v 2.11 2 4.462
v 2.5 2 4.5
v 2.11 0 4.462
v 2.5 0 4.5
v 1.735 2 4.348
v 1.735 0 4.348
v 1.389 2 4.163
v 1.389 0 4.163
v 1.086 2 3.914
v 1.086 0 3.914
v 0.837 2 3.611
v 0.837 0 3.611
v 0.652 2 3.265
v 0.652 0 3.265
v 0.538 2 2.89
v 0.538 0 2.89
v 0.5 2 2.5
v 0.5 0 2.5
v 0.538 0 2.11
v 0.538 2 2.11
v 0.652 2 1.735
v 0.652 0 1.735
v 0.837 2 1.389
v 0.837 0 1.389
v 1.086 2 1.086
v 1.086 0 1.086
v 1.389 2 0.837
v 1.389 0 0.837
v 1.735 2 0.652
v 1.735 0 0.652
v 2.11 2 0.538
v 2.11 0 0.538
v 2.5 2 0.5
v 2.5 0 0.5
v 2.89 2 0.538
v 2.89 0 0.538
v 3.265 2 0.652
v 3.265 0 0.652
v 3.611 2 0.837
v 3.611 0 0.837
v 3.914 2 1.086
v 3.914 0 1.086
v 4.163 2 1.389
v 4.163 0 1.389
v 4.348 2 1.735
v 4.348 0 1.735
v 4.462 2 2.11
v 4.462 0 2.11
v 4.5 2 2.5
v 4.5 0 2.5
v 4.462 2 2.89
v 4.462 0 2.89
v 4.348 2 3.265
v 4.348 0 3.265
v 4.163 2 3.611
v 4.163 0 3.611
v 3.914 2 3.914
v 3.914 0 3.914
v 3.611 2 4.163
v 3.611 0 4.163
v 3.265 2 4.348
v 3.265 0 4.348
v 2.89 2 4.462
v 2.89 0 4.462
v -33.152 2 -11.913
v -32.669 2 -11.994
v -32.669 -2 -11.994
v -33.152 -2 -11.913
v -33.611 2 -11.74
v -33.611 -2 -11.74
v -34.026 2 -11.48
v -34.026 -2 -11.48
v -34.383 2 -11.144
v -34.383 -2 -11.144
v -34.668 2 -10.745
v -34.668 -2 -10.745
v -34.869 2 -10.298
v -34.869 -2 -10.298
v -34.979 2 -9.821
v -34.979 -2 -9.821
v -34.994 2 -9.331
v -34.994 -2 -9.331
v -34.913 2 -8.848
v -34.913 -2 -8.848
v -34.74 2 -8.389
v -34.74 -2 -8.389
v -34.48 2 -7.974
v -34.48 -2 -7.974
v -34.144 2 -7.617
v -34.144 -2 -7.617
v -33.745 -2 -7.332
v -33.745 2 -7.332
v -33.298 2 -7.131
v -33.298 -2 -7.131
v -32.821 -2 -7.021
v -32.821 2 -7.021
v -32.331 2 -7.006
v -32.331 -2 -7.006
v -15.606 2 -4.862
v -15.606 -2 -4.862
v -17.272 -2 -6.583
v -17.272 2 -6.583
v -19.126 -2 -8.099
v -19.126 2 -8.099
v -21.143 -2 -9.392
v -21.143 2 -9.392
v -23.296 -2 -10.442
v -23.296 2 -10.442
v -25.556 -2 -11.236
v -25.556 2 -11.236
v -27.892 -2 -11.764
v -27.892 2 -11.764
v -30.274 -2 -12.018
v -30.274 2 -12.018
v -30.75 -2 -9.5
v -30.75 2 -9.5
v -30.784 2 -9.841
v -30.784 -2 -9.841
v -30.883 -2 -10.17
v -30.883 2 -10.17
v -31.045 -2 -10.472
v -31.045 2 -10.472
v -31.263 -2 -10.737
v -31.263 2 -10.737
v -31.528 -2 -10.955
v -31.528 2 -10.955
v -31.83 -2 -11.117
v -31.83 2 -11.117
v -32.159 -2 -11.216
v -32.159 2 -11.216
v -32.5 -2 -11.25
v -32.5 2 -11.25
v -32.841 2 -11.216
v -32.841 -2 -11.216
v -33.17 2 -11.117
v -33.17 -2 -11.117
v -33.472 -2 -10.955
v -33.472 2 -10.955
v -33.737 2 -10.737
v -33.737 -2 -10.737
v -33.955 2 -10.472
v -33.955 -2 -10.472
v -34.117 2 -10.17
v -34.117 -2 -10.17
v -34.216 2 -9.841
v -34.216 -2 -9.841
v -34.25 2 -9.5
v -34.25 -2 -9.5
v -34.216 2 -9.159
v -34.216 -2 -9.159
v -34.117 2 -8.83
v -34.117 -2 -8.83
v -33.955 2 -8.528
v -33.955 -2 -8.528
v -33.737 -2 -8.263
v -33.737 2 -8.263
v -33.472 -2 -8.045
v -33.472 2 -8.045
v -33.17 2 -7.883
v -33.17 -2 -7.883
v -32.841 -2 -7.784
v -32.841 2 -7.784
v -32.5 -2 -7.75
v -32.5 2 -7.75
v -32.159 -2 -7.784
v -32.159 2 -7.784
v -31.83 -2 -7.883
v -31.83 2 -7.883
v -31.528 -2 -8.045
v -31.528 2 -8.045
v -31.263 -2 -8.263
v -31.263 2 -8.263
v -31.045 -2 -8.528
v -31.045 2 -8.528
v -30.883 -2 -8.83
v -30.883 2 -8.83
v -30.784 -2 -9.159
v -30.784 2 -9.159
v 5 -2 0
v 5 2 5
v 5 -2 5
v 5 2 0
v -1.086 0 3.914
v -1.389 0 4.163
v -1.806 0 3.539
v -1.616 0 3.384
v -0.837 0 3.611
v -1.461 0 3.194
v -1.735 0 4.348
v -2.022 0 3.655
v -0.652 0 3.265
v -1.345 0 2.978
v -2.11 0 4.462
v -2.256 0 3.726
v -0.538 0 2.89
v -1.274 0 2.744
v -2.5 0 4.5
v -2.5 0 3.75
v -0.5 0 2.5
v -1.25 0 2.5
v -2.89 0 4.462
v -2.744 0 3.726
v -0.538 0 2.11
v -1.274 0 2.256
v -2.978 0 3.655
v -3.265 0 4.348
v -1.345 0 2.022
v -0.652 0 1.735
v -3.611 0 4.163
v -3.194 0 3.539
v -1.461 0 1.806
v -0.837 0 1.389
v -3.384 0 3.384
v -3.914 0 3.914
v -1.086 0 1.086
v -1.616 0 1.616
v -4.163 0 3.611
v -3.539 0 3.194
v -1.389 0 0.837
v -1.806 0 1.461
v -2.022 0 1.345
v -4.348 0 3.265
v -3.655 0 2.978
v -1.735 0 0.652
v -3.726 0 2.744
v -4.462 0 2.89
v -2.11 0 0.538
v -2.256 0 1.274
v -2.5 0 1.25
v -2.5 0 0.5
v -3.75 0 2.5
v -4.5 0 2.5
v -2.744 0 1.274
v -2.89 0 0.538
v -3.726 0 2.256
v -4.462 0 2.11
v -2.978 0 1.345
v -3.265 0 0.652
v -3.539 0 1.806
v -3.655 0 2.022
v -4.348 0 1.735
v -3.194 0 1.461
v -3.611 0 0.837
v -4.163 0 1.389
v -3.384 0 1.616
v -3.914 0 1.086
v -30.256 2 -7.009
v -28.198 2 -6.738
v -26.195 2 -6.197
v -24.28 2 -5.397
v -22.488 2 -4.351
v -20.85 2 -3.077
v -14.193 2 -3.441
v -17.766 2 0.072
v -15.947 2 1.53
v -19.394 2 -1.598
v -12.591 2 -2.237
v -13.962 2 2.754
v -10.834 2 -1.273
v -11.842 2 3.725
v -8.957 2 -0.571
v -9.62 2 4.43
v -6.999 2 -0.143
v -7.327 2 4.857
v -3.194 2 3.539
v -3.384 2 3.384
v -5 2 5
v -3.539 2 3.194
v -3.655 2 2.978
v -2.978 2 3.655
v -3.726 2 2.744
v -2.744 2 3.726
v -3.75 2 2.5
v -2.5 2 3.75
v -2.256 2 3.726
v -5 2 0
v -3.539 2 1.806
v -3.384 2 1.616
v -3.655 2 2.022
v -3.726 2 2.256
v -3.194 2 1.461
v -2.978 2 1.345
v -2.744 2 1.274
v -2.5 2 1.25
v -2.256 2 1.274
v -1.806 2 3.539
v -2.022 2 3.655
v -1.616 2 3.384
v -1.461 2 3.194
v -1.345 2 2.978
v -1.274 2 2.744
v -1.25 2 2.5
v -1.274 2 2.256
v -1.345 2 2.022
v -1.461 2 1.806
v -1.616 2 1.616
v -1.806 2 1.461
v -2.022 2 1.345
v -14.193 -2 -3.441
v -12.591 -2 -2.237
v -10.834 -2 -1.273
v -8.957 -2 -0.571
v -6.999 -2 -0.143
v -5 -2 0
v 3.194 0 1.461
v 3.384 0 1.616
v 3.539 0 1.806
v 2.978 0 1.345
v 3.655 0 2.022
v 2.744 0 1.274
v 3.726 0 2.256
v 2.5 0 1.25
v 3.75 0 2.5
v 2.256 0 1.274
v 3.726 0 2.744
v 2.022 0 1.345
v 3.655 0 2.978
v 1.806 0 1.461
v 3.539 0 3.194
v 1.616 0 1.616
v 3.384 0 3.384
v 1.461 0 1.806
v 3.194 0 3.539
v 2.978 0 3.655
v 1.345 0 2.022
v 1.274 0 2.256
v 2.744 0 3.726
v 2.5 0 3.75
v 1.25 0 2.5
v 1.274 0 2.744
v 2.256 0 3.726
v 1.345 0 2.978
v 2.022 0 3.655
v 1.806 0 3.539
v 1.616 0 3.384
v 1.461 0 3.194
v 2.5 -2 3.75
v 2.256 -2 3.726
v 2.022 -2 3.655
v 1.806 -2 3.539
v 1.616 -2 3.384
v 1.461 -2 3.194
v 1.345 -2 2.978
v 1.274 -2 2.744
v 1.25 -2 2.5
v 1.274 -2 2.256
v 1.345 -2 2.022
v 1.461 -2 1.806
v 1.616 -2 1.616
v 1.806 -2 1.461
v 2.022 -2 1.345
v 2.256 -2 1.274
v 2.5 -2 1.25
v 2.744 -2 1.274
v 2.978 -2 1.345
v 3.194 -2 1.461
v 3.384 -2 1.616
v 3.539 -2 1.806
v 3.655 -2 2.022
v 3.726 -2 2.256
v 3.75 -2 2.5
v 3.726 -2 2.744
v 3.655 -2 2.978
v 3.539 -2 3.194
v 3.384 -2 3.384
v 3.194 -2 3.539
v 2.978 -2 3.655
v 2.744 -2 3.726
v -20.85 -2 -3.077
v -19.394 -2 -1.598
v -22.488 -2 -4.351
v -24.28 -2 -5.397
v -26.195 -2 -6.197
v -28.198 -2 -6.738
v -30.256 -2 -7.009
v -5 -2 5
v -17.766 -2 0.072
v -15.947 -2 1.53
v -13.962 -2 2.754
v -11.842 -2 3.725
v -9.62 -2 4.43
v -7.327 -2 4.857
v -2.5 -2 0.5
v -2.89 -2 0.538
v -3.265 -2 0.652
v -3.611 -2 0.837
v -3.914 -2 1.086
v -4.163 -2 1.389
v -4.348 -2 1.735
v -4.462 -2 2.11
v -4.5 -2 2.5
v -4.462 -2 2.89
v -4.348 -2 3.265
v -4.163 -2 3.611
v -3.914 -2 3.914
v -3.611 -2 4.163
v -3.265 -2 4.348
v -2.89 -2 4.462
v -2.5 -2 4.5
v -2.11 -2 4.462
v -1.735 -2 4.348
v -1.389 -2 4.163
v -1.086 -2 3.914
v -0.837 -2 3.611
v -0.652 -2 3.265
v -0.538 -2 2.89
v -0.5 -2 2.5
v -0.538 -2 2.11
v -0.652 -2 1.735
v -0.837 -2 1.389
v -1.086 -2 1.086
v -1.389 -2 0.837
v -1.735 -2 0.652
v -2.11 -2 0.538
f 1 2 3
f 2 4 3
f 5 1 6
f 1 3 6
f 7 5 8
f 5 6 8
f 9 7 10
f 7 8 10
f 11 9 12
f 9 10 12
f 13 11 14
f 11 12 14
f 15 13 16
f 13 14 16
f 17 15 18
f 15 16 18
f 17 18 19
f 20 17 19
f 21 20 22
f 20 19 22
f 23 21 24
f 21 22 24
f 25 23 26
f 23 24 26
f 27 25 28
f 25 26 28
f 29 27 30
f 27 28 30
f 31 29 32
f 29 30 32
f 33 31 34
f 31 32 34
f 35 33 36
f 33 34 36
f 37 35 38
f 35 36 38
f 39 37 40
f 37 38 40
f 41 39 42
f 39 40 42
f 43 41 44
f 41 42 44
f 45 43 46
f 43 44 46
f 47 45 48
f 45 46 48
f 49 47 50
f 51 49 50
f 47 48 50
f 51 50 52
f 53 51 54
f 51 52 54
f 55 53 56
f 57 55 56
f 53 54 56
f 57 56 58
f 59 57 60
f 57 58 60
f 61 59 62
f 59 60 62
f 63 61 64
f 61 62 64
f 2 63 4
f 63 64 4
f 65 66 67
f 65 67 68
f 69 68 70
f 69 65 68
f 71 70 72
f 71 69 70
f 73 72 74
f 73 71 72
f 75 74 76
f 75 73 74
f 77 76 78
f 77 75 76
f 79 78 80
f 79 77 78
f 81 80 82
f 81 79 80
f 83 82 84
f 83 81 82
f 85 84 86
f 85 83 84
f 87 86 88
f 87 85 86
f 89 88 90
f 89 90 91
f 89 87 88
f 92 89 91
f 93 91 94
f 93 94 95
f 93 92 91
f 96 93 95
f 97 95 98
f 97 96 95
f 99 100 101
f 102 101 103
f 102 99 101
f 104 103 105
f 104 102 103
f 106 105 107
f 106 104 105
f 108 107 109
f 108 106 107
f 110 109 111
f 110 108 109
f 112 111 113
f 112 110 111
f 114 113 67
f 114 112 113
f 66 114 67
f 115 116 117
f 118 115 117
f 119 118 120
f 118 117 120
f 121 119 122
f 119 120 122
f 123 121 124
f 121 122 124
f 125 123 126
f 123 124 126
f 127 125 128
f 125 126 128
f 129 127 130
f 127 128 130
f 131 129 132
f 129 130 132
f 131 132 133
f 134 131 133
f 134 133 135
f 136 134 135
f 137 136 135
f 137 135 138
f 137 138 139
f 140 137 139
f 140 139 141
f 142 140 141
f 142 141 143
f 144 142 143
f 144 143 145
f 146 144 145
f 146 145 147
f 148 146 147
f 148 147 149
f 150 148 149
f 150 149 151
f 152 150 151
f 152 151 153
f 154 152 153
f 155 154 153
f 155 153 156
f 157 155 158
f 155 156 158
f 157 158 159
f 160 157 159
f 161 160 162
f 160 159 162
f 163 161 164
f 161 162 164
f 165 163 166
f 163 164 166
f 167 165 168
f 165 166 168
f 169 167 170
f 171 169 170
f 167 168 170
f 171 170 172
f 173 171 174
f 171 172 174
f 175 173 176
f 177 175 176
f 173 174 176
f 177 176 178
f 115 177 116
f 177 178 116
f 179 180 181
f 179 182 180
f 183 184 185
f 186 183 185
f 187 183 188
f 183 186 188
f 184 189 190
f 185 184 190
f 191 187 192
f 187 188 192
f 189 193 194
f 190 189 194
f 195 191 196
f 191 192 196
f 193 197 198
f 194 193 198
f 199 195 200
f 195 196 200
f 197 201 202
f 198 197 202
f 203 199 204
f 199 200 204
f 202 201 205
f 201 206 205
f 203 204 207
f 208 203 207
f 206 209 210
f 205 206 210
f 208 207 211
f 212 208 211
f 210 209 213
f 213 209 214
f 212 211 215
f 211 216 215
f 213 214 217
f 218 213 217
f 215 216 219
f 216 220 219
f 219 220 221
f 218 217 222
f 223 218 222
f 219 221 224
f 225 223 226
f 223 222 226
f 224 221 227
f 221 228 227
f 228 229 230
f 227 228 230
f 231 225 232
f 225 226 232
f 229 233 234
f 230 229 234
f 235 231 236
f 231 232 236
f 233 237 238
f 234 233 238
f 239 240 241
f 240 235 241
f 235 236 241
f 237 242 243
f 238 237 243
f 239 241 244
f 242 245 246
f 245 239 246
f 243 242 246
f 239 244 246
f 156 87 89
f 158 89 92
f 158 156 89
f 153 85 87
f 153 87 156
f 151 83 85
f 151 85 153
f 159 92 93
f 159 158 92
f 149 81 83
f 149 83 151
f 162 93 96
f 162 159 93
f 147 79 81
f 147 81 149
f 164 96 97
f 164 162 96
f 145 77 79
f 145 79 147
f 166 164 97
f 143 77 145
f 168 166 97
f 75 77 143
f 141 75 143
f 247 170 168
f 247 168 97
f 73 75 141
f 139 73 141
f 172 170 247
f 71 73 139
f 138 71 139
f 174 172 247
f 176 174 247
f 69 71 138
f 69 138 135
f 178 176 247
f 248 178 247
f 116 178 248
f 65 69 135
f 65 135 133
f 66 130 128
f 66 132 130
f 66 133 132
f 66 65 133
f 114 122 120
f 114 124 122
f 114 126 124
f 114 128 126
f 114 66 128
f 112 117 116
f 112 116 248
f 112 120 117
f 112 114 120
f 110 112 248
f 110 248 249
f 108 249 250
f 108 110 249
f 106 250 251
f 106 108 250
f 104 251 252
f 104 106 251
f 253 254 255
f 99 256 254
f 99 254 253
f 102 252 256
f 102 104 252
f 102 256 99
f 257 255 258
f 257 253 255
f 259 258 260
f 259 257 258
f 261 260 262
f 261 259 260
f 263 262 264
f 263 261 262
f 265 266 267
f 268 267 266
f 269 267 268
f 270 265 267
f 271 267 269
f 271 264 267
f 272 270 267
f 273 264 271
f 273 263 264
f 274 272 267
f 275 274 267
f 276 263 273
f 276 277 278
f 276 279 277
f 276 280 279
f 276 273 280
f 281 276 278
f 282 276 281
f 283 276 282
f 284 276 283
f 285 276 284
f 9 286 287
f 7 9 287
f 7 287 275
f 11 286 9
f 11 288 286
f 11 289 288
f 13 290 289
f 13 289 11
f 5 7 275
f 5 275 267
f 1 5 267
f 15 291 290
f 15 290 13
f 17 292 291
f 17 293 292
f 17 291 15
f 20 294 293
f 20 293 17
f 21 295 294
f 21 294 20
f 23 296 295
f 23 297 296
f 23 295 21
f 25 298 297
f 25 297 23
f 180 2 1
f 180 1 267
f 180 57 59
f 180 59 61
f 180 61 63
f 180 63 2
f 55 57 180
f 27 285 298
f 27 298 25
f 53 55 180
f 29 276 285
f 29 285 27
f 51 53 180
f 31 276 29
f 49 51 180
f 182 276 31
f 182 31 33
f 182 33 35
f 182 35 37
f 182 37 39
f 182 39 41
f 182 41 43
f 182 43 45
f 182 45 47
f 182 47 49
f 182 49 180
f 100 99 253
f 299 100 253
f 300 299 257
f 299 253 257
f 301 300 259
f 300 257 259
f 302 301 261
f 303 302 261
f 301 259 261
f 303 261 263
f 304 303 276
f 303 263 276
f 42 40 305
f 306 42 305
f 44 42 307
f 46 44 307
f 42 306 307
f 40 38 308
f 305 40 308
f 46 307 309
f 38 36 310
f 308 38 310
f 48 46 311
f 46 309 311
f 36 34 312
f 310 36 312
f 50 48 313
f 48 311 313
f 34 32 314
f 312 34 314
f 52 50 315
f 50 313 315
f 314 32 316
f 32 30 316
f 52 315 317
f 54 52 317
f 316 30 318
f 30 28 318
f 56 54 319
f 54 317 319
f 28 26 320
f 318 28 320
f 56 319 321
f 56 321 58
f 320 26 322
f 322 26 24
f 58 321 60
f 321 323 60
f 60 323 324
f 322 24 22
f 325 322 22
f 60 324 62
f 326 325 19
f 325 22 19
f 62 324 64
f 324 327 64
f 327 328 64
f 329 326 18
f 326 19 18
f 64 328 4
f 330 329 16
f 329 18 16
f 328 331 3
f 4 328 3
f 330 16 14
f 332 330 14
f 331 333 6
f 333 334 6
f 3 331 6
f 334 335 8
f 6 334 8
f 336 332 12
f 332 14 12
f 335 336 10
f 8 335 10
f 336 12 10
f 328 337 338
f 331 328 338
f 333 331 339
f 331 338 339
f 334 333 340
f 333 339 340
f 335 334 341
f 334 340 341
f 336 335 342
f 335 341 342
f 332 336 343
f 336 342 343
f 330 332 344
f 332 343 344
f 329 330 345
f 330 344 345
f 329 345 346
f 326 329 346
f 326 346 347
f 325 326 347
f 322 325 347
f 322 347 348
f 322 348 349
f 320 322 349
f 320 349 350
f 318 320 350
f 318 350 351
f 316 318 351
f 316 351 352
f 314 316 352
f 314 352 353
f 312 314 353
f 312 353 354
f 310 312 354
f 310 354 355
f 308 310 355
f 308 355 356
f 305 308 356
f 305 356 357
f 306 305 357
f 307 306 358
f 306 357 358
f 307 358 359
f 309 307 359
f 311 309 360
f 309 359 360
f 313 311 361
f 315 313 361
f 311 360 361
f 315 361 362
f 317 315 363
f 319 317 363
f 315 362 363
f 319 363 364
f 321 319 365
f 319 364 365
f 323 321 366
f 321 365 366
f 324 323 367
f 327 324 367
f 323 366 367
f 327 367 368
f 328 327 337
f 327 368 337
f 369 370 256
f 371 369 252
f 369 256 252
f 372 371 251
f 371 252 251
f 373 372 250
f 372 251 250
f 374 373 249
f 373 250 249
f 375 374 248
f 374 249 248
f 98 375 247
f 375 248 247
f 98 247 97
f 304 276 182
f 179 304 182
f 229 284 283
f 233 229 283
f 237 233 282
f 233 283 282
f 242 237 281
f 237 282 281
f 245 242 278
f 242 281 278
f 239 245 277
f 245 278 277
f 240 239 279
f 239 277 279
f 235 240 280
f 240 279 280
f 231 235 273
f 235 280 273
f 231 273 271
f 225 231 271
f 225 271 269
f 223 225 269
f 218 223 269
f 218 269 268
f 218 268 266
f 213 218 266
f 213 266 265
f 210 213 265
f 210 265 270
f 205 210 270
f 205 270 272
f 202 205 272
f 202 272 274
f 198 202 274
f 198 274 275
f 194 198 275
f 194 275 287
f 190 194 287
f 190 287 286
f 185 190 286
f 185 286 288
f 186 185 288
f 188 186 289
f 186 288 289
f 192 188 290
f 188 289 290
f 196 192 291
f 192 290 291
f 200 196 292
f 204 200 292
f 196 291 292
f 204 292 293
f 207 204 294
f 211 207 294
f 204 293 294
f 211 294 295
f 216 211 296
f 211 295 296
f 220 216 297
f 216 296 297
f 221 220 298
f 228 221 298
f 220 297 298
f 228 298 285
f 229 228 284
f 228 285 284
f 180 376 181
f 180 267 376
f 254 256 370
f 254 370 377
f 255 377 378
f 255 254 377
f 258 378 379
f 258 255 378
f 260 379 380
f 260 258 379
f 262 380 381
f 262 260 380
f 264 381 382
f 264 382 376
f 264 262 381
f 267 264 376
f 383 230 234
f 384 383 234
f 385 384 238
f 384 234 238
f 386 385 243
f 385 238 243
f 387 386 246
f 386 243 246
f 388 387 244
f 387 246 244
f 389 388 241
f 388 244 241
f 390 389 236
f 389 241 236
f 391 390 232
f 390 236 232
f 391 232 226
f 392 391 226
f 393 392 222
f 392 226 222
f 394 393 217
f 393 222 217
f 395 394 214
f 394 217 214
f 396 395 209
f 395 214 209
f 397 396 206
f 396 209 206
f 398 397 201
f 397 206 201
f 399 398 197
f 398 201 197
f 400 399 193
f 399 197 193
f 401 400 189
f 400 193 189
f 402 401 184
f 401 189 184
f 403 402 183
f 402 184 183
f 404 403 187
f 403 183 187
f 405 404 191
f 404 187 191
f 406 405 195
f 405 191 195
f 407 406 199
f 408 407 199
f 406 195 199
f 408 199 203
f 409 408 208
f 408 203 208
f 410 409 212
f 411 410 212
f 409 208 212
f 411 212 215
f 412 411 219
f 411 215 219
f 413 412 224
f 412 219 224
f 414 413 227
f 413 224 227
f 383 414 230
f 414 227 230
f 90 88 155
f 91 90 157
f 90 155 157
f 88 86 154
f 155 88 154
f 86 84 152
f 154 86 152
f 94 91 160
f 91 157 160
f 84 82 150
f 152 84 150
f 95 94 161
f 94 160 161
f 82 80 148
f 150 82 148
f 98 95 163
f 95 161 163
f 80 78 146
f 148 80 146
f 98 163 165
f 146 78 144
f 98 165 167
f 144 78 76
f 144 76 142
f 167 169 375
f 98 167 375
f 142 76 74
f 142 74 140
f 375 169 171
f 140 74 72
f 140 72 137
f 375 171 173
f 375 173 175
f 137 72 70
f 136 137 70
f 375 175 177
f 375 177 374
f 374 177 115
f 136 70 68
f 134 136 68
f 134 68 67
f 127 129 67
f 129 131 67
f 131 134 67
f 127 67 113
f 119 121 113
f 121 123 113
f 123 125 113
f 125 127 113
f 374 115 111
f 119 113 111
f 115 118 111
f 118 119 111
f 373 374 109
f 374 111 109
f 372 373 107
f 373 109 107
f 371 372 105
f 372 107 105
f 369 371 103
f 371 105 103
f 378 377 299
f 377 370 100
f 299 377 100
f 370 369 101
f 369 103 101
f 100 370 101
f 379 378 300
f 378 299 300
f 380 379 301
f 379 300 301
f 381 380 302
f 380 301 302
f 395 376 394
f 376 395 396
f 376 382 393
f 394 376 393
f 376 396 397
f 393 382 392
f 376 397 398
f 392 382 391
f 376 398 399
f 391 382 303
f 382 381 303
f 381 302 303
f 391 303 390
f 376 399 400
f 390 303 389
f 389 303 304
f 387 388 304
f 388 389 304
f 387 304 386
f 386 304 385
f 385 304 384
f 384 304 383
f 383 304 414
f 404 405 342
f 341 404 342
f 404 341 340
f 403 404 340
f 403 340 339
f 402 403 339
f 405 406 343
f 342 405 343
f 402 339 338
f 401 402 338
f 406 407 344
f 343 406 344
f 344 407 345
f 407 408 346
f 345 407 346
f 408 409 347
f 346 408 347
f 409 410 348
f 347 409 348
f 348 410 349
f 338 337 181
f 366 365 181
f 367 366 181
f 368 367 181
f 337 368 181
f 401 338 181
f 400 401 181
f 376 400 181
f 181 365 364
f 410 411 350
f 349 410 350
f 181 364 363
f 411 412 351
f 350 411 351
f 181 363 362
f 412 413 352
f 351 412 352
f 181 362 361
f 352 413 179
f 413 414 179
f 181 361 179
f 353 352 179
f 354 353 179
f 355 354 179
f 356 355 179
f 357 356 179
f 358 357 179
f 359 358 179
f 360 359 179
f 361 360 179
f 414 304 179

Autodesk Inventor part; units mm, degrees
ref_plane "YZ Plane" through (0, 0, 0) normal (1, 0, 0) x (0, 1, 0)
ref_plane "XZ Plane" through (0, 0, 0) normal (0, 1, 0) x (-1, 0, 0)
ref_plane "XY Plane" through (0, 0, 0) normal (0, 0, 1) x (1, 0, 0)
sketch "Sketch1" plane through (0, 0, 0) normal (0, 0, 1) x (1, 0, 0)
  line L0 (-7, 0) -> (7, 0) construction
  line L1 (0, -2.8) -> (0, 2.8) construction
  line L2 (5, -2) -> (-5, -2)
  line L3 (-5, -2) -> (-5, 2)
  line L4 (-5, 2) -> (5, 2)
  line L5 (5, 2) -> (5, -2)
  line L6 (5, -2) -> (-5, 2) construction
  line L7 (-5, -2) -> (5, 2) construction
  point P0 (0, 0)
  dimension "d8" = 4
  dimension "d9" = 10
extrude "Extrusion1" add sketch "Sketch1" along normal blind 5
sketch "Sketch2" plane through (-5, 2, 0) normal (0, 1, 0) x (1, 0, 0)
  line L0 (10, 0) -> (10, -5) projected
  line L1 (10, 0) -> (0, 0) projected
  point P0 (5, 0)
  point P1 (7.5, -2.5)
  point P2 (10, -2.5)
  dimension "d12" = 2.5
hole "Hole1" at (2.5, 2, 2.5) direction (0, -1, 0) diameter 2.5 depth 10 tip angle 118 counterbore diameter 4 counterbore depth 2
sketch "Sketch3" plane through (-5, -2, 0) normal (0, -1, 0) x (1, 0, 0)
  circle A0 centre (7.5, 2.5) radius 1.25 projected
  point P0 (5, 0)
  point P1 (2.5, 2.5)
  dimension "d21" = 5
hole "Hole2" at (-2.5, -2, 2.5) direction (0, 1, 0) diameter 2.5 depth 10 tip angle 118 counterbore diameter 4 counterbore depth 2
sketch "Sketch4" plane through (-5, 2, 0) normal (0, 1, 0) x (1, 0, 0)
  line L0 (0, 0) -> (0, -5) projected
  arc A0 (-12.5, 3.2297) -> (0, -2.5) centre (0, 14) ccw construction
  arc A1 (-14.3939, 1.5978) -> (0, -5) centre (0, 14) ccw
  arc A2 (-10.6061, 4.8615) -> (0, 0) centre (0, 14) ccw
  arc A3 (-10.6061, 4.8615) -> (-14.3939, 1.5978) centre (-12.5, 3.2297) ccw construction
  line L1 (10, 0) -> (0, 0) projected
  line L2 (10, -5) -> (0, -5) projected
  arc A4 (-12.5, 3.2297) -> (-27.5, 9.5) centre (-26.2704, -8.6352) ccw construction
  arc A5 (-10.6061, 4.8615) -> (-27.6691, 11.9943) centre (-26.2704, -8.6352) ccw
  arc A6 (-14.3939, 1.5978) -> (-27.3309, 7.0057) centre (-26.2704, -8.6352) ccw
  arc A7 (-14.3939, 1.5978) -> (-10.6061, 4.8615) centre (-12.5, 3.2297) ccw construction
  arc A8 (-27.6691, 11.9943) -> (-27.3309, 7.0057) centre (-27.5, 9.5) ccw
  circle A9 centre (2.5, -2.5) radius 1.25 projected
  circle A10 centre (-27.5, 9.5) radius 1.75
  point P0 (5, 0)
  point P1 (0, 0)
  point P2 (-14.3939, 1.5978)
  point P3 (0, -5)
  dimension "d30" = 15
  dimension "d31" = 15
  dimension "d32" = 12
  dimension "d33" = 14
  dimension "d34" = 3.5
extrude "Extrusion2" add sketch "Sketch4" against normal blind 4 contours L0 A1 A6 A8 A5 A2
properties part number "huzo1"
